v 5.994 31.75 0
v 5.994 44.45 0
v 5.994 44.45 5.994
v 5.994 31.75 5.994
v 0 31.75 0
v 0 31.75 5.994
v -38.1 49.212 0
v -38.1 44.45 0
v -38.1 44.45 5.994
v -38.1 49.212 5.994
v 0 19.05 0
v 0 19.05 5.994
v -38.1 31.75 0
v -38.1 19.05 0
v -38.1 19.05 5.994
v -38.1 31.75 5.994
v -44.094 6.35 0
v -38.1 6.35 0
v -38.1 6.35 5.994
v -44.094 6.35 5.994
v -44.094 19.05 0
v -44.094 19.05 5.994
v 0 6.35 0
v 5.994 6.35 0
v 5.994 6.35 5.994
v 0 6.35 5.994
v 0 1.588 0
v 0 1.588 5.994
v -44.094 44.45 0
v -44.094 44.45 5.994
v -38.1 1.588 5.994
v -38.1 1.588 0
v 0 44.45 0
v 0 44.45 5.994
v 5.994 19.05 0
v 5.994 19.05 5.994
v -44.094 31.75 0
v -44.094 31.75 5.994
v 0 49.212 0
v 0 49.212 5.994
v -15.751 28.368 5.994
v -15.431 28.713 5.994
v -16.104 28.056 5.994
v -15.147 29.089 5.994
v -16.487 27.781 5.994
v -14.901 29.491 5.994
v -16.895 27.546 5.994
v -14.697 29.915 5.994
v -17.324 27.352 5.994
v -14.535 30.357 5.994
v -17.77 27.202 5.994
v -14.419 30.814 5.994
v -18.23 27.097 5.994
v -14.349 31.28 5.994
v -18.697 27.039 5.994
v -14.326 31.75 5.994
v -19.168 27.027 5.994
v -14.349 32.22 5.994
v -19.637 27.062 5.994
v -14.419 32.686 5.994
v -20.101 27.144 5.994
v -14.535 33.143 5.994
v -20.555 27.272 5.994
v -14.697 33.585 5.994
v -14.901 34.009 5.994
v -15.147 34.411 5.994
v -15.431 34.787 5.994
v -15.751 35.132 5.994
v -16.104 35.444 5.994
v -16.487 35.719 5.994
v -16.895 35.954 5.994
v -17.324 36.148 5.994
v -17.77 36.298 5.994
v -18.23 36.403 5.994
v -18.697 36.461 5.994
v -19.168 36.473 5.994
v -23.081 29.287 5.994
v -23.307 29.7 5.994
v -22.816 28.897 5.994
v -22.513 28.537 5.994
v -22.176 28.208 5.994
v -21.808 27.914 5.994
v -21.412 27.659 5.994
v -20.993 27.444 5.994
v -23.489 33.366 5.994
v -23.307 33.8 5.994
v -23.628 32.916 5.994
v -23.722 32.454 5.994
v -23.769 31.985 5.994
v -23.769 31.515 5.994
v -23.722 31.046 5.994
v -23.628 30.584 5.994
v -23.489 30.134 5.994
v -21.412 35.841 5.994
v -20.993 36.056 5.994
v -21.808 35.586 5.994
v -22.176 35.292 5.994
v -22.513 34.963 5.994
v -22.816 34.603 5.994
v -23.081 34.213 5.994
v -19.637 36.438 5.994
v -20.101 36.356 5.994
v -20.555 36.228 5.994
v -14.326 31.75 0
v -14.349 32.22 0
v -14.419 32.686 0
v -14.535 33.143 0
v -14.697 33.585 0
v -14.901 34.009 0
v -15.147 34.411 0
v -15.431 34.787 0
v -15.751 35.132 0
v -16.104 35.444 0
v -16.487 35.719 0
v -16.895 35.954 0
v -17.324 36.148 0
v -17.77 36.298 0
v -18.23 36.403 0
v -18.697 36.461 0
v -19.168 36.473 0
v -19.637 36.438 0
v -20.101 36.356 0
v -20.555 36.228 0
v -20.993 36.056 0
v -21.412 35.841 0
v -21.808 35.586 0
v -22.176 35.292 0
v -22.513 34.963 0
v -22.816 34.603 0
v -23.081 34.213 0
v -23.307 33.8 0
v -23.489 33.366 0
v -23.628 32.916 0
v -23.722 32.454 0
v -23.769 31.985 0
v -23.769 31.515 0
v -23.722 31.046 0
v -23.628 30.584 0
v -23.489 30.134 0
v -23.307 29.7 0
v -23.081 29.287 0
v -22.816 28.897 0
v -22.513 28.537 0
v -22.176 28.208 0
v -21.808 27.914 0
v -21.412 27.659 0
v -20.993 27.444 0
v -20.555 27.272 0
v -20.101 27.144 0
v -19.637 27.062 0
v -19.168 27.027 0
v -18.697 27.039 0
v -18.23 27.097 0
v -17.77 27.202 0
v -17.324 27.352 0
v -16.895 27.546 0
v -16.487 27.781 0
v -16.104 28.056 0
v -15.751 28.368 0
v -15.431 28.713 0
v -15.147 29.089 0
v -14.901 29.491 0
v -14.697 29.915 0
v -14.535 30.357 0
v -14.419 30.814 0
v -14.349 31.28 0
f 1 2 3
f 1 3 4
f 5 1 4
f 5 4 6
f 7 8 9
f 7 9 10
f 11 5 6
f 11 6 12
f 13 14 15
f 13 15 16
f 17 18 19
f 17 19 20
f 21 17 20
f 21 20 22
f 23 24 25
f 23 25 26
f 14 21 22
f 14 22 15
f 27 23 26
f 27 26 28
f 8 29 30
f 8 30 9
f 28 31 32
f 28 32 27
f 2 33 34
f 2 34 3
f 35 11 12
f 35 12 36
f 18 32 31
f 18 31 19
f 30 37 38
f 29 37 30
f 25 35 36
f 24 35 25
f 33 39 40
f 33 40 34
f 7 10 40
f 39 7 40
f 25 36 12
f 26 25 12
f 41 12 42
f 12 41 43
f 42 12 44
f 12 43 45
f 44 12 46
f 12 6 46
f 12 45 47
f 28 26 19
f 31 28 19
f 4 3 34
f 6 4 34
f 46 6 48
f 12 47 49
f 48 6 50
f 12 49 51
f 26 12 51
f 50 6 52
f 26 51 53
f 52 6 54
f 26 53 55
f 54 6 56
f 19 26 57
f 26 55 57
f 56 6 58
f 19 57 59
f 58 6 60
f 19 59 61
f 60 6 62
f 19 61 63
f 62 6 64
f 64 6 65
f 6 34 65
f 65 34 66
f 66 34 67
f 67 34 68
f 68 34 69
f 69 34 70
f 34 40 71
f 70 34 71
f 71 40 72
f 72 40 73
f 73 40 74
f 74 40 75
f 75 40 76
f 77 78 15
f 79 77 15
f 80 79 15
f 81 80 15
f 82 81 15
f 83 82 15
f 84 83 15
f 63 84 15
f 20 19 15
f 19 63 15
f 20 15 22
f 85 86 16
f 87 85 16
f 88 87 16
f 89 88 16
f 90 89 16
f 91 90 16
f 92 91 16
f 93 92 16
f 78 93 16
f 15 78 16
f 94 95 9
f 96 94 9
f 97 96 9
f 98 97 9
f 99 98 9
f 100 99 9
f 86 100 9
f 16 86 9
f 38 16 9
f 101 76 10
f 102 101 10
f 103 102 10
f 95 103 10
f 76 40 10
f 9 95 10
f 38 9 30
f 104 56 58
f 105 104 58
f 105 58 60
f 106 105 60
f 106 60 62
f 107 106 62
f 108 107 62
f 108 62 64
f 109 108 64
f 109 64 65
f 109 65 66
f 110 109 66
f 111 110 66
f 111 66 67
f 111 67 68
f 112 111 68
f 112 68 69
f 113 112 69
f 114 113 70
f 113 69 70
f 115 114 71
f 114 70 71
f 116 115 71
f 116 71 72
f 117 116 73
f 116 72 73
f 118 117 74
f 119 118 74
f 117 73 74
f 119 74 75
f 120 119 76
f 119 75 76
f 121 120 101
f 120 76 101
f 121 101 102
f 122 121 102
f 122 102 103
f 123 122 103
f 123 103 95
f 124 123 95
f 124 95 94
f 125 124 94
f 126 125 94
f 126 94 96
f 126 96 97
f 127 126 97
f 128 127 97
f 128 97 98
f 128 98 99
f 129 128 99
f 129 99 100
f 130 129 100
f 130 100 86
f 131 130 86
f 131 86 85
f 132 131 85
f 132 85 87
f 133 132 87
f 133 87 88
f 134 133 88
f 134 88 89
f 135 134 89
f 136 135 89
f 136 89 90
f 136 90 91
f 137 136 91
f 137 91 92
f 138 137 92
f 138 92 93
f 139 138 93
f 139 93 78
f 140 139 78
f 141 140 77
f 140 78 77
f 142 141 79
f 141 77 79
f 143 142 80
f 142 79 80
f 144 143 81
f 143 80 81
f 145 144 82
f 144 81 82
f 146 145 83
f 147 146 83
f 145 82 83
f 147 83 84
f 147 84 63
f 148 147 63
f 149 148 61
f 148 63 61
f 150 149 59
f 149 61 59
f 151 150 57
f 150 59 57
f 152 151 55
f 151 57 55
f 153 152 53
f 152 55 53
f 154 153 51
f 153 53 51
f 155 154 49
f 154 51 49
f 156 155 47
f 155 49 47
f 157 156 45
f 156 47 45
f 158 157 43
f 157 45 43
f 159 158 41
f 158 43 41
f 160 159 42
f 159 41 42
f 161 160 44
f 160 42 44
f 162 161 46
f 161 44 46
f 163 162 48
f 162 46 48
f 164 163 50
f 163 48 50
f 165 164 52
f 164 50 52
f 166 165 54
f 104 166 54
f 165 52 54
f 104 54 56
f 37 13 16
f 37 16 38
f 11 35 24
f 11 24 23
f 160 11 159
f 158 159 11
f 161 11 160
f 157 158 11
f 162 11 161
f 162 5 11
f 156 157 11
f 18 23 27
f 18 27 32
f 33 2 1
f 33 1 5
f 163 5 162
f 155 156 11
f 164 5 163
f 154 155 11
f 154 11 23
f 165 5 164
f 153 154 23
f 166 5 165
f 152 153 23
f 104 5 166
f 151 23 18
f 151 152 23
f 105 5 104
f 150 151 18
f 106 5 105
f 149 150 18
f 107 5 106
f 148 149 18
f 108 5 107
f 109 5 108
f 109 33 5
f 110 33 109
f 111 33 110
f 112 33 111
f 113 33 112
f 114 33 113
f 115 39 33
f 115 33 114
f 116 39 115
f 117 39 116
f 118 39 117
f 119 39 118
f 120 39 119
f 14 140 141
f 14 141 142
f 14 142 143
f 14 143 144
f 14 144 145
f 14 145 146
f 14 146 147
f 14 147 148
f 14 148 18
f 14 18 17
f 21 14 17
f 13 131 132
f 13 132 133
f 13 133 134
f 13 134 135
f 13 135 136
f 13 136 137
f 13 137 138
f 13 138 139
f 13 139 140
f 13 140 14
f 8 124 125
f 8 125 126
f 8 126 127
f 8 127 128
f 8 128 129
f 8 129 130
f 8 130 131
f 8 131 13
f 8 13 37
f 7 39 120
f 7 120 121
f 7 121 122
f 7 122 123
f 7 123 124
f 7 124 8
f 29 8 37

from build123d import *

# Parameters (mm, degrees)
BOSS_EXTRUDE1_DEPTH = 5.9944
SKETCH2_R           = 4.7244
CUT_EXTRUDE1_DEPTH  = 6.9944
SKETCH3_W           = 38.1
SKETCH3_H           = 1.5875
CUT_EXTRUDE2_DEPTH  = 6.9944


with BuildPart() as part:
    # Sketch1 → Boss-Extrude1 (new body)
    with BuildSketch(Plane.XY):
        Polygon((0, 0), (-38.1, 0), (-38.1, 6.35), (-44.0944, 6.35), (-44.0944, 19.05), (-38.1, 19.05), (-38.1, 31.75), (-44.0944, 31.75), (-44.0944, 44.45), (-38.1, 44.45), (-38.1, 50.8), (0, 50.8), (0, 44.45), (5.9944, 44.45), (5.9944, 31.75), (0, 31.75), (0, 19.05), (5.9944, 19.05), (5.9944, 6.35), (0, 6.35), align=None)
    extrude(amount=BOSS_EXTRUDE1_DEPTH)

    # Sketch2 → Cut-Extrude1 (cut, through all)
    with BuildSketch(Plane.XY.offset(5.9944)):
        with Locations((-19.05, 31.75)):
            Circle(SKETCH2_R)
    extrude(amount=-CUT_EXTRUDE1_DEPTH, mode=Mode.SUBTRACT)

    # Sketch3 → Cut-Extrude2 (cut, through all)
    with BuildSketch(Plane.XY.offset(5.9944)):
        with Locations((-19.05, 0.79375)):
            Rectangle(SKETCH3_W, SKETCH3_H)
        with Locations((-19.05, 50.00625)):
            Rectangle(SKETCH3_W, SKETCH3_H)
    extrude(amount=-CUT_EXTRUDE2_DEPTH, mode=Mode.SUBTRACT)


solid = part.part
